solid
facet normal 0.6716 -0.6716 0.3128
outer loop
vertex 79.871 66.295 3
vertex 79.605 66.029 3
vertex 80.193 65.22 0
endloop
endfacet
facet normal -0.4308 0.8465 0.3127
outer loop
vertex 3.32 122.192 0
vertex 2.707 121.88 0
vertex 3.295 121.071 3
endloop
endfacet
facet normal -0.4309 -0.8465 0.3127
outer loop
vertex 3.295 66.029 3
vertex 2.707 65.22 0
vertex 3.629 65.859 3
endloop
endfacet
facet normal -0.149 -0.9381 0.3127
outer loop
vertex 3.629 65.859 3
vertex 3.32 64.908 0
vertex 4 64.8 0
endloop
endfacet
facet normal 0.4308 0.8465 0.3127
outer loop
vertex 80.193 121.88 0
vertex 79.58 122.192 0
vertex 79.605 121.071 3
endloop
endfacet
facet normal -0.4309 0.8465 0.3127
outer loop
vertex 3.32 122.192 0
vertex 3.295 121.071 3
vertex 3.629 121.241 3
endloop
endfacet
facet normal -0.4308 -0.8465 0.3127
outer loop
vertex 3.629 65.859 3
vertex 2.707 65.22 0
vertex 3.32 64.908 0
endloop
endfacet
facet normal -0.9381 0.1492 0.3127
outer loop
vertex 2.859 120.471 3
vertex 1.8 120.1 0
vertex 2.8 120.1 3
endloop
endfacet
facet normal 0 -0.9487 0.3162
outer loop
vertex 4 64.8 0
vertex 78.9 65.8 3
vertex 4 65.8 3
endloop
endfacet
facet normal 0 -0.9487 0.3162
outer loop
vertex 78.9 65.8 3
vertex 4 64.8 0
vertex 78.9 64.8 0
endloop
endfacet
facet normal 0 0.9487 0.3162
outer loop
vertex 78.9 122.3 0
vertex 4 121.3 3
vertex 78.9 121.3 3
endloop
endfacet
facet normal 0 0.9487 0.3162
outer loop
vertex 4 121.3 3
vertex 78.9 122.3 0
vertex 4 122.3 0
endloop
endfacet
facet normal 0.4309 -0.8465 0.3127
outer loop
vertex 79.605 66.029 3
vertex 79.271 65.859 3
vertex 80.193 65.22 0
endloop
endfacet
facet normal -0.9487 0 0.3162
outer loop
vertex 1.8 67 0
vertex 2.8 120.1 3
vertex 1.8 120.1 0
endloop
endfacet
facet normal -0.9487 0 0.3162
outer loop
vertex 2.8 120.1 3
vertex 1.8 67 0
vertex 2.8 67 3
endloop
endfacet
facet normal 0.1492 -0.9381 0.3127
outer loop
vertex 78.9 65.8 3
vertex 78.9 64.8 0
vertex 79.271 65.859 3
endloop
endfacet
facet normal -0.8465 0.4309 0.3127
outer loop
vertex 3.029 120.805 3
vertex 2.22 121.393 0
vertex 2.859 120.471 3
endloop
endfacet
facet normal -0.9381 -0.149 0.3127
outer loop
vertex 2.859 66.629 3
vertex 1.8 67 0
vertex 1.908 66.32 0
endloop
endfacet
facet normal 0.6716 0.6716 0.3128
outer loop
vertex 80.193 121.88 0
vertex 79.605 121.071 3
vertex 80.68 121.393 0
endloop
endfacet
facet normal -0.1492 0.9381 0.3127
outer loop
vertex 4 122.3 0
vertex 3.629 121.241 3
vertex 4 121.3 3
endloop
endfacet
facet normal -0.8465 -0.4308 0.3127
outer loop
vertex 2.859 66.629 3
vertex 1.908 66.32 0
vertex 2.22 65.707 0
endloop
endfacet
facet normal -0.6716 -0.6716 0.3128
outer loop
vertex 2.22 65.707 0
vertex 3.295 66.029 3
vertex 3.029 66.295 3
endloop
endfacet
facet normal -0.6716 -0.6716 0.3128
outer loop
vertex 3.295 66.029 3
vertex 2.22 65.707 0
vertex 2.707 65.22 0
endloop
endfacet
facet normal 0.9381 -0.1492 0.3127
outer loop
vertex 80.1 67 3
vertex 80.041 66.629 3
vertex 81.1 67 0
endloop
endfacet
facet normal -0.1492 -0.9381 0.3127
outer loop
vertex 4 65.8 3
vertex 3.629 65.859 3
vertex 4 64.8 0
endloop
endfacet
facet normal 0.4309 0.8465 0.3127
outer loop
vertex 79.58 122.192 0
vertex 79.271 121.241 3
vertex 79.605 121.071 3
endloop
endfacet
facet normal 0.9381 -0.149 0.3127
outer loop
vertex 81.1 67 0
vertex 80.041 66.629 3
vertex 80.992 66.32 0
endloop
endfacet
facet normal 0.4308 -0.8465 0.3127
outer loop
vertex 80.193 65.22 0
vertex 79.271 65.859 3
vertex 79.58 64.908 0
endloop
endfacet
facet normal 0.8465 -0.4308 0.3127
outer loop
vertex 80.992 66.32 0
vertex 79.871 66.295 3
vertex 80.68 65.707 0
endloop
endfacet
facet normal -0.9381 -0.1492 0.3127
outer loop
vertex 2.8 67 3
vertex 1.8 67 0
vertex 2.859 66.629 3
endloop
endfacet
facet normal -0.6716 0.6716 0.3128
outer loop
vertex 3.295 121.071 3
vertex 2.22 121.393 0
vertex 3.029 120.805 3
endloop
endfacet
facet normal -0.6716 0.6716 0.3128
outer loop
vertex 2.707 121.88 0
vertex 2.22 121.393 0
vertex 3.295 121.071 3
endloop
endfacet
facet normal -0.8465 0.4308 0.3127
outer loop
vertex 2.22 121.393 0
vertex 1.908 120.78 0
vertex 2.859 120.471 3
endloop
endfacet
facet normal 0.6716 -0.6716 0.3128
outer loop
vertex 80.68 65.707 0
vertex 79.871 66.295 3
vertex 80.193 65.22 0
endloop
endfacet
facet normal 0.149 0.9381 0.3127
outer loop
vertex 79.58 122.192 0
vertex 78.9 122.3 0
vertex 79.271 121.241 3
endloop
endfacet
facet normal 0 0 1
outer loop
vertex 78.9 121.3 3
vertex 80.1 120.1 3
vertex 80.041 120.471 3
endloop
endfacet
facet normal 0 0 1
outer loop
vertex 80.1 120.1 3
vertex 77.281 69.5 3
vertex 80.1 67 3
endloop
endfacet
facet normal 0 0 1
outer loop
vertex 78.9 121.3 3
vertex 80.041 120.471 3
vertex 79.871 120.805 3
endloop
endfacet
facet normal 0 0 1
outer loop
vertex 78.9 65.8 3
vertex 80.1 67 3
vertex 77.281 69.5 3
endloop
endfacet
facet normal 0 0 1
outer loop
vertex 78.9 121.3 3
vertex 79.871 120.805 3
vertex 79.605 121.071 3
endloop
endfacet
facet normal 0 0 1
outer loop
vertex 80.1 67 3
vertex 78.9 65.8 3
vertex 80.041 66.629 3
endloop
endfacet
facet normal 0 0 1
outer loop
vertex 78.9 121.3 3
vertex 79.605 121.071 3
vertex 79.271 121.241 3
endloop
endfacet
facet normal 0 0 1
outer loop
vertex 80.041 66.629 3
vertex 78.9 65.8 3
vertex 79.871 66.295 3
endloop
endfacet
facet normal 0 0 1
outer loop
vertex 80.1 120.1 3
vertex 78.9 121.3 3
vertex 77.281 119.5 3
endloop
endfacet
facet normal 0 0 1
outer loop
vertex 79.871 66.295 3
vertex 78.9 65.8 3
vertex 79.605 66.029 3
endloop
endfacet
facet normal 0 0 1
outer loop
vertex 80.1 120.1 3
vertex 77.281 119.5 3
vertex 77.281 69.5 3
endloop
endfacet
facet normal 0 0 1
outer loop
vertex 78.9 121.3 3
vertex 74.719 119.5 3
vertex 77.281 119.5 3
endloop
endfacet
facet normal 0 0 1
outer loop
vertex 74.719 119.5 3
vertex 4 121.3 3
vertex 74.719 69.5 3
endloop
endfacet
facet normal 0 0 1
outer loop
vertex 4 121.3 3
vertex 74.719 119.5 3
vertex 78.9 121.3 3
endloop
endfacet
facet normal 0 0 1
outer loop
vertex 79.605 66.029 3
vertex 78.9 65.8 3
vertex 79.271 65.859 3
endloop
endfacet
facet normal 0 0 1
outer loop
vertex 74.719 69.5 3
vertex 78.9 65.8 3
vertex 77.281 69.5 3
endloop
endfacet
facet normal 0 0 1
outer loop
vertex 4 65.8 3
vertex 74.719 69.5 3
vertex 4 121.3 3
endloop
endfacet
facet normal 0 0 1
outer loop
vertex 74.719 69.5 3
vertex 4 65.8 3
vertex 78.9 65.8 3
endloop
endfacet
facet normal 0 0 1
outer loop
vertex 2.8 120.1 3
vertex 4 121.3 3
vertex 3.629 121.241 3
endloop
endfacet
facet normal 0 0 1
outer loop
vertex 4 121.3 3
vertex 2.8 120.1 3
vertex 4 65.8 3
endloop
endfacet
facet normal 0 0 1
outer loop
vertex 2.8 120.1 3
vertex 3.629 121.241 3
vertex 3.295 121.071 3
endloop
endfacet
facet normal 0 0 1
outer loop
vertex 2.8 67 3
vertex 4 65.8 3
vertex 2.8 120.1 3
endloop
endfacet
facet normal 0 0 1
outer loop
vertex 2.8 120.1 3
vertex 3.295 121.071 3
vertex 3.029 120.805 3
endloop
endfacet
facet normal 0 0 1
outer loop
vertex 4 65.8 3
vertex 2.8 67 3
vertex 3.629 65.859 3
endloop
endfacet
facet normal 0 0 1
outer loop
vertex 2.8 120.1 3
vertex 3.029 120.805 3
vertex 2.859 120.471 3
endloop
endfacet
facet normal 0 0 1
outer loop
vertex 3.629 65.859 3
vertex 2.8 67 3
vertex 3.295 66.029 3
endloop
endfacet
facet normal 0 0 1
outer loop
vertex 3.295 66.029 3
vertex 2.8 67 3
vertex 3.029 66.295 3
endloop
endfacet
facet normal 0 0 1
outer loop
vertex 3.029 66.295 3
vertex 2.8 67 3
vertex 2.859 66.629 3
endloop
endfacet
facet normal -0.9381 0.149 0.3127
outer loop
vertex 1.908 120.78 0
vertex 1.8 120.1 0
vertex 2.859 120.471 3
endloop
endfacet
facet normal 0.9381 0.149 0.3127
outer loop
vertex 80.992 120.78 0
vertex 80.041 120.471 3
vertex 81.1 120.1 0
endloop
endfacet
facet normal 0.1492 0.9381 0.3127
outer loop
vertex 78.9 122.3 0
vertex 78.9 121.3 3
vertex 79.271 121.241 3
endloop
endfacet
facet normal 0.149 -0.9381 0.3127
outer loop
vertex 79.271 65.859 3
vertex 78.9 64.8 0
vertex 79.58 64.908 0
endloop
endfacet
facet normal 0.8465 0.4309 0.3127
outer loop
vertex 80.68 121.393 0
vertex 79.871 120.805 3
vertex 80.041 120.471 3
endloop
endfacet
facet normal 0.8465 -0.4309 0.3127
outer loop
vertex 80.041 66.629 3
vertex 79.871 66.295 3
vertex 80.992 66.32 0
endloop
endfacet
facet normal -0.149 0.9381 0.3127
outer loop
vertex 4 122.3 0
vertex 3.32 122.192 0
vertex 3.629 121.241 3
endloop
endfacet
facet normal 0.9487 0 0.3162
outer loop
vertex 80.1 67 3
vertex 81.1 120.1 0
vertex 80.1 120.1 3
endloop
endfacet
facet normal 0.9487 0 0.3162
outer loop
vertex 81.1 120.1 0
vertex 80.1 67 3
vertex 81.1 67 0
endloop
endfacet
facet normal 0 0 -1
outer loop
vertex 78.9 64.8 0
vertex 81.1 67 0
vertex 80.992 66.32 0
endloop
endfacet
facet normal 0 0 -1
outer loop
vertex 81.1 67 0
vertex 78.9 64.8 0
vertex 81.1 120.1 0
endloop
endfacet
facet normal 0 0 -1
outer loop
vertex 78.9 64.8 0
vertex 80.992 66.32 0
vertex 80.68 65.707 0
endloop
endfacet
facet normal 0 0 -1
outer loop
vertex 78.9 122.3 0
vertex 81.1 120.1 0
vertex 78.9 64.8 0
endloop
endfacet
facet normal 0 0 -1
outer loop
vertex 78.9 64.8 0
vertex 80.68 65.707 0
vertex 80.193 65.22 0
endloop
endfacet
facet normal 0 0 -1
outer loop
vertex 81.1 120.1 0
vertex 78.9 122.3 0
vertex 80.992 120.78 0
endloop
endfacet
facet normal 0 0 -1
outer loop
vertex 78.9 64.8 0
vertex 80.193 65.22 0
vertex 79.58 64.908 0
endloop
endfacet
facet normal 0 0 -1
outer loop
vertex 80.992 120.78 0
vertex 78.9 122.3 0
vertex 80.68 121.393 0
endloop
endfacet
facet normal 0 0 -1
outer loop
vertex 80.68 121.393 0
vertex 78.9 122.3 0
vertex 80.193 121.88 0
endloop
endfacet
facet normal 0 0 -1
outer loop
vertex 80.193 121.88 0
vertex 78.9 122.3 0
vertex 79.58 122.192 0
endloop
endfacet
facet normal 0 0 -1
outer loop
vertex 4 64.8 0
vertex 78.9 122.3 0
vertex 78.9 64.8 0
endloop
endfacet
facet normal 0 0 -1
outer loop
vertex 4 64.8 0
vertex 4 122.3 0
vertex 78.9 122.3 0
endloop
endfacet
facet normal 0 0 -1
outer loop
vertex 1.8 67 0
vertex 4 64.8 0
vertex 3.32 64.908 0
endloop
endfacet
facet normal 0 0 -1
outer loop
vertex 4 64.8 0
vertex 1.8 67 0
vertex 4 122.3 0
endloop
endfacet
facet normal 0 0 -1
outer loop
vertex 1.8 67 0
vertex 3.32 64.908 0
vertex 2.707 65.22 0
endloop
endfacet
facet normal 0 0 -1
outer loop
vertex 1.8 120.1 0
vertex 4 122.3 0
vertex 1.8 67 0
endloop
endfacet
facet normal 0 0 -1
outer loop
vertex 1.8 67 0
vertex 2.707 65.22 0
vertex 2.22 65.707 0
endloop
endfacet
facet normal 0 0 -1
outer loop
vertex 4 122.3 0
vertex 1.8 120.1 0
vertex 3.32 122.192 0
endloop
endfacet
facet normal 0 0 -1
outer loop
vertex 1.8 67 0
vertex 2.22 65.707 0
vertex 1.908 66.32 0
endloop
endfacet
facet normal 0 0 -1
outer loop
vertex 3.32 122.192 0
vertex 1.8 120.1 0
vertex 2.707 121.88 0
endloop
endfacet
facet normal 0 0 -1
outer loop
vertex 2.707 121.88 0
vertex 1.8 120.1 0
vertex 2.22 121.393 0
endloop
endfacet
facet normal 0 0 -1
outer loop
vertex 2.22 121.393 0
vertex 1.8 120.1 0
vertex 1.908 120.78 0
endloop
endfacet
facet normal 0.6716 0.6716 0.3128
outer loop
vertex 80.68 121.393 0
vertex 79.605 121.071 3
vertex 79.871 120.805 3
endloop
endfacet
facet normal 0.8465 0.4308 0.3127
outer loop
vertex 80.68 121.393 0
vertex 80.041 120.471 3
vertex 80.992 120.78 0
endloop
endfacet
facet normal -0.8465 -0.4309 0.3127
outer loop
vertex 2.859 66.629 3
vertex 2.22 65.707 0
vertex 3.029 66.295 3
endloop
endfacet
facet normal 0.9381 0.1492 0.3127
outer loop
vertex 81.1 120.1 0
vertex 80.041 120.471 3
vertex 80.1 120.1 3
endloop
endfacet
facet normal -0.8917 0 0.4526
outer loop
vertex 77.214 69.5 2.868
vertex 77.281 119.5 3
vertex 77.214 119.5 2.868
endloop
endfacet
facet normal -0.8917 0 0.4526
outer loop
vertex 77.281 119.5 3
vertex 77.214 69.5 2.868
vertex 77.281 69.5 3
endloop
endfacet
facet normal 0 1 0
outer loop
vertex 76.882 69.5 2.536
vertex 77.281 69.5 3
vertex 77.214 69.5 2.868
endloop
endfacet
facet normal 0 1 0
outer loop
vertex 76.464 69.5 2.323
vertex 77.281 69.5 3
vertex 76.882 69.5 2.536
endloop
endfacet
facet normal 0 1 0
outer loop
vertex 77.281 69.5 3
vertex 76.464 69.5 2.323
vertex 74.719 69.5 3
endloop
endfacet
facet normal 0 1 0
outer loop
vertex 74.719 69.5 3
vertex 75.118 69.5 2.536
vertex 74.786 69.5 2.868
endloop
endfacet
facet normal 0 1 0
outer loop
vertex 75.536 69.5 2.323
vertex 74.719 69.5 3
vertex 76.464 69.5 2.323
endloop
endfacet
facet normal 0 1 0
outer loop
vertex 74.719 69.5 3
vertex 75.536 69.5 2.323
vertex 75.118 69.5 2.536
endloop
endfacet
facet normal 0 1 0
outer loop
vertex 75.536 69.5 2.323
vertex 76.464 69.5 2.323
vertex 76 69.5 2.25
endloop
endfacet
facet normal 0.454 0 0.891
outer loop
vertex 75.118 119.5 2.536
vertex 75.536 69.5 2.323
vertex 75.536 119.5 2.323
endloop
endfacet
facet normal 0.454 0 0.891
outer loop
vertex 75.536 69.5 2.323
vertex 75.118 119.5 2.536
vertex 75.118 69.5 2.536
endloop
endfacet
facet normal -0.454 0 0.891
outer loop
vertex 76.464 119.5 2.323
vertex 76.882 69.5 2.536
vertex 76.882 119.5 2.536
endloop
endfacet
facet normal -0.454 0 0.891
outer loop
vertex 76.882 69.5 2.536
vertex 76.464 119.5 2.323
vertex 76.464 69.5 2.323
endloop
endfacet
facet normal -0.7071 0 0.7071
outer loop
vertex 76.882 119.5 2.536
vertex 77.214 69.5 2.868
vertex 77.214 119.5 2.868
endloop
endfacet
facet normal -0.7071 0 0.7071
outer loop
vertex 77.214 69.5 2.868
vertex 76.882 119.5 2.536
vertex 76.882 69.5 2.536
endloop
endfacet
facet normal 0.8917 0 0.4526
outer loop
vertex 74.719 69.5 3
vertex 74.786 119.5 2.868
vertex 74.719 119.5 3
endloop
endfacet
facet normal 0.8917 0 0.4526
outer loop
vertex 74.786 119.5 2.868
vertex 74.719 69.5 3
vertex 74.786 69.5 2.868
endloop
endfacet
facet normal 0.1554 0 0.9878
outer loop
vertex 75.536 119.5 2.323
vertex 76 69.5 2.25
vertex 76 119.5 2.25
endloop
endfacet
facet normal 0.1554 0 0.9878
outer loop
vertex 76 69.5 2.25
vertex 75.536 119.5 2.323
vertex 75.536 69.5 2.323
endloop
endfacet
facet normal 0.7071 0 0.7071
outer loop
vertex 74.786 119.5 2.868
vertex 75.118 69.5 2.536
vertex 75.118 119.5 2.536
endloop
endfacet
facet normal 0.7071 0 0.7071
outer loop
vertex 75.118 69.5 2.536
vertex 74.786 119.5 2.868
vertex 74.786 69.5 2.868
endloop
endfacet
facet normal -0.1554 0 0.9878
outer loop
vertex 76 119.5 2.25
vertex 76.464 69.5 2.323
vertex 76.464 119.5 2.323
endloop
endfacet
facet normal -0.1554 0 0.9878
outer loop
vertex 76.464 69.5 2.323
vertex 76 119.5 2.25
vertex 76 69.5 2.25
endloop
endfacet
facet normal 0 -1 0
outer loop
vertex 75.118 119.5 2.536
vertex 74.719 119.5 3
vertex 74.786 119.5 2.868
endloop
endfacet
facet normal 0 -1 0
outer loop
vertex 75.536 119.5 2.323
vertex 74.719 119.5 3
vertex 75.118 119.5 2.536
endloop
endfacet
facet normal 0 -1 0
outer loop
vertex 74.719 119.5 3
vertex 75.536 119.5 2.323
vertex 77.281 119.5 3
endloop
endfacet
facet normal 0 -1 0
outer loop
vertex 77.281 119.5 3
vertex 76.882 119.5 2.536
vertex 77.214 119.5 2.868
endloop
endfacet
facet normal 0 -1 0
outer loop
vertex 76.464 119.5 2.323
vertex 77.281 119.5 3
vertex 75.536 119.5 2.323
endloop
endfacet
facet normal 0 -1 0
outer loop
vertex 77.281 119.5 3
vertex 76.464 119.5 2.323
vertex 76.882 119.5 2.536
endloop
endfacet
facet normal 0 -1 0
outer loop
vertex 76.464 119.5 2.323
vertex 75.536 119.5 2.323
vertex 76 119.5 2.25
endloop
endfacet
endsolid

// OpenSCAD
// Source: http://www.thingiverse.com/thing:468917
// Modified by PeterProvost

$fn = 20;

wall_thickness = 3;
items_to_print = "lid";   // ["box", "lid", "both"]
width = 55 + 2*wall_thickness;
length = 76 + 2*wall_thickness;
height = 56 + 2*wall_thickness;
//ensure that the edge roundness is greater than the wall thickness
edge_roundness = 4;
tolerance = 0.3;


/* [Hidden] */

//ignore!
inner_box_dimentions = [length,width,height];

if (items_to_print != "lid")
difference ()
{

	hull()
	{
		addOutterCorners(0,0);
		addOutterCorners(1,0);
		addOutterCorners(0,1);
		addOutterCorners(1,1);
	}
	
	translate([0,0,wall_thickness])
	hull()
	{
		addInnerCorners(0,0);
		addInnerCorners(1,0);
		addInnerCorners(0,1);
		addInnerCorners(1,1);
	}

	translate([0,0,inner_box_dimentions[2]+0.1])
	hull()
	{
		addLidCorners(0,0);
		addLidCorners(1,0);
		addLidCorners(0,1);
		addLidCorners(1,1);
	}

	translate([inner_box_dimentions[0]-wall_thickness,0,inner_box_dimentions[2]+0.1])
	cube([wall_thickness,inner_box_dimentions[1],wall_thickness]);
}

if (items_to_print != "box")
difference ()
{
	translate([0,inner_box_dimentions[1]+2,0])
	hull()
	{
		Lid(0,0);
		Lid(1,0);
		Lid(0,1);
		Lid(1,1);
	}

	//translate([20,inner_box_dimentions[1]*1.5+2,0])
	//rotate([0,90,0]);
translate([inner_box_dimentions[0]-2*wall_thickness,inner_box_dimentions[1]*2-2.5,wall_thickness*1.25])
rotate([90,0,0]) cylinder(h=width-2*wall_thickness-5, d=wall_thickness);

}



module addOutterCorners(x = 0, y = 0)
{
	translate([(inner_box_dimentions[0] - edge_roundness*2 + 0.1)*x,(inner_box_dimentions[1] - edge_roundness*2 +0.1)*y,0] + [edge_roundness,edge_roundness,0])

	cylinder(inner_box_dimentions[2]+wall_thickness,edge_roundness,edge_roundness);
	
	echo((inner_box_dimentions[0] - edge_roundness)*x);
	echo((inner_box_dimentions[1] - edge_roundness)*y);
}

module addInnerCorners(x = 0, y = 0)
{
	translate([(inner_box_dimentions[0] - edge_roundness*2 + 0.1)*x,(inner_box_dimentions[1] - edge_roundness*2 +0.1)*y,0] + [edge_roundness,edge_roundness,0])

	cylinder(inner_box_dimentions[2],edge_roundness-wall_thickness,edge_roundness-wall_thickness);
	
	echo((inner_box_dimentions[0] - edge_roundness)*x);
	echo((inner_box_dimentions[1] - edge_roundness)*y);
}

module addLidCorners(x = 0, y = 0)
{
	translate([(inner_box_dimentions[0] - edge_roundness*2 - 0.1 +wall_thickness)*x,(inner_box_dimentions[1] - edge_roundness*2 +0.1)*y,0] + [edge_roundness,edge_roundness,0])

	cylinder(wall_thickness,edge_roundness-wall_thickness+1.5,edge_roundness-wall_thickness+0.5);
	
	echo((inner_box_dimentions[0] - edge_roundness)*x);
	echo((inner_box_dimentions[1] - edge_roundness)*y);
}

module Lid(x = 0, y = 0)
{
	translate([(inner_box_dimentions[0] - edge_roundness*2 - 0.1 +wall_thickness-2)*x,(inner_box_dimentions[1] - edge_roundness*2 +0.1)*y,0] + [edge_roundness,edge_roundness,0])

	cylinder(wall_thickness,edge_roundness-wall_thickness+1.5-tolerance,edge_roundness-wall_thickness+0.5-tolerance);
	
	echo((inner_box_dimentions[0] - edge_roundness)*x);
	echo((inner_box_dimentions[1] - edge_roundness)*y);
}
